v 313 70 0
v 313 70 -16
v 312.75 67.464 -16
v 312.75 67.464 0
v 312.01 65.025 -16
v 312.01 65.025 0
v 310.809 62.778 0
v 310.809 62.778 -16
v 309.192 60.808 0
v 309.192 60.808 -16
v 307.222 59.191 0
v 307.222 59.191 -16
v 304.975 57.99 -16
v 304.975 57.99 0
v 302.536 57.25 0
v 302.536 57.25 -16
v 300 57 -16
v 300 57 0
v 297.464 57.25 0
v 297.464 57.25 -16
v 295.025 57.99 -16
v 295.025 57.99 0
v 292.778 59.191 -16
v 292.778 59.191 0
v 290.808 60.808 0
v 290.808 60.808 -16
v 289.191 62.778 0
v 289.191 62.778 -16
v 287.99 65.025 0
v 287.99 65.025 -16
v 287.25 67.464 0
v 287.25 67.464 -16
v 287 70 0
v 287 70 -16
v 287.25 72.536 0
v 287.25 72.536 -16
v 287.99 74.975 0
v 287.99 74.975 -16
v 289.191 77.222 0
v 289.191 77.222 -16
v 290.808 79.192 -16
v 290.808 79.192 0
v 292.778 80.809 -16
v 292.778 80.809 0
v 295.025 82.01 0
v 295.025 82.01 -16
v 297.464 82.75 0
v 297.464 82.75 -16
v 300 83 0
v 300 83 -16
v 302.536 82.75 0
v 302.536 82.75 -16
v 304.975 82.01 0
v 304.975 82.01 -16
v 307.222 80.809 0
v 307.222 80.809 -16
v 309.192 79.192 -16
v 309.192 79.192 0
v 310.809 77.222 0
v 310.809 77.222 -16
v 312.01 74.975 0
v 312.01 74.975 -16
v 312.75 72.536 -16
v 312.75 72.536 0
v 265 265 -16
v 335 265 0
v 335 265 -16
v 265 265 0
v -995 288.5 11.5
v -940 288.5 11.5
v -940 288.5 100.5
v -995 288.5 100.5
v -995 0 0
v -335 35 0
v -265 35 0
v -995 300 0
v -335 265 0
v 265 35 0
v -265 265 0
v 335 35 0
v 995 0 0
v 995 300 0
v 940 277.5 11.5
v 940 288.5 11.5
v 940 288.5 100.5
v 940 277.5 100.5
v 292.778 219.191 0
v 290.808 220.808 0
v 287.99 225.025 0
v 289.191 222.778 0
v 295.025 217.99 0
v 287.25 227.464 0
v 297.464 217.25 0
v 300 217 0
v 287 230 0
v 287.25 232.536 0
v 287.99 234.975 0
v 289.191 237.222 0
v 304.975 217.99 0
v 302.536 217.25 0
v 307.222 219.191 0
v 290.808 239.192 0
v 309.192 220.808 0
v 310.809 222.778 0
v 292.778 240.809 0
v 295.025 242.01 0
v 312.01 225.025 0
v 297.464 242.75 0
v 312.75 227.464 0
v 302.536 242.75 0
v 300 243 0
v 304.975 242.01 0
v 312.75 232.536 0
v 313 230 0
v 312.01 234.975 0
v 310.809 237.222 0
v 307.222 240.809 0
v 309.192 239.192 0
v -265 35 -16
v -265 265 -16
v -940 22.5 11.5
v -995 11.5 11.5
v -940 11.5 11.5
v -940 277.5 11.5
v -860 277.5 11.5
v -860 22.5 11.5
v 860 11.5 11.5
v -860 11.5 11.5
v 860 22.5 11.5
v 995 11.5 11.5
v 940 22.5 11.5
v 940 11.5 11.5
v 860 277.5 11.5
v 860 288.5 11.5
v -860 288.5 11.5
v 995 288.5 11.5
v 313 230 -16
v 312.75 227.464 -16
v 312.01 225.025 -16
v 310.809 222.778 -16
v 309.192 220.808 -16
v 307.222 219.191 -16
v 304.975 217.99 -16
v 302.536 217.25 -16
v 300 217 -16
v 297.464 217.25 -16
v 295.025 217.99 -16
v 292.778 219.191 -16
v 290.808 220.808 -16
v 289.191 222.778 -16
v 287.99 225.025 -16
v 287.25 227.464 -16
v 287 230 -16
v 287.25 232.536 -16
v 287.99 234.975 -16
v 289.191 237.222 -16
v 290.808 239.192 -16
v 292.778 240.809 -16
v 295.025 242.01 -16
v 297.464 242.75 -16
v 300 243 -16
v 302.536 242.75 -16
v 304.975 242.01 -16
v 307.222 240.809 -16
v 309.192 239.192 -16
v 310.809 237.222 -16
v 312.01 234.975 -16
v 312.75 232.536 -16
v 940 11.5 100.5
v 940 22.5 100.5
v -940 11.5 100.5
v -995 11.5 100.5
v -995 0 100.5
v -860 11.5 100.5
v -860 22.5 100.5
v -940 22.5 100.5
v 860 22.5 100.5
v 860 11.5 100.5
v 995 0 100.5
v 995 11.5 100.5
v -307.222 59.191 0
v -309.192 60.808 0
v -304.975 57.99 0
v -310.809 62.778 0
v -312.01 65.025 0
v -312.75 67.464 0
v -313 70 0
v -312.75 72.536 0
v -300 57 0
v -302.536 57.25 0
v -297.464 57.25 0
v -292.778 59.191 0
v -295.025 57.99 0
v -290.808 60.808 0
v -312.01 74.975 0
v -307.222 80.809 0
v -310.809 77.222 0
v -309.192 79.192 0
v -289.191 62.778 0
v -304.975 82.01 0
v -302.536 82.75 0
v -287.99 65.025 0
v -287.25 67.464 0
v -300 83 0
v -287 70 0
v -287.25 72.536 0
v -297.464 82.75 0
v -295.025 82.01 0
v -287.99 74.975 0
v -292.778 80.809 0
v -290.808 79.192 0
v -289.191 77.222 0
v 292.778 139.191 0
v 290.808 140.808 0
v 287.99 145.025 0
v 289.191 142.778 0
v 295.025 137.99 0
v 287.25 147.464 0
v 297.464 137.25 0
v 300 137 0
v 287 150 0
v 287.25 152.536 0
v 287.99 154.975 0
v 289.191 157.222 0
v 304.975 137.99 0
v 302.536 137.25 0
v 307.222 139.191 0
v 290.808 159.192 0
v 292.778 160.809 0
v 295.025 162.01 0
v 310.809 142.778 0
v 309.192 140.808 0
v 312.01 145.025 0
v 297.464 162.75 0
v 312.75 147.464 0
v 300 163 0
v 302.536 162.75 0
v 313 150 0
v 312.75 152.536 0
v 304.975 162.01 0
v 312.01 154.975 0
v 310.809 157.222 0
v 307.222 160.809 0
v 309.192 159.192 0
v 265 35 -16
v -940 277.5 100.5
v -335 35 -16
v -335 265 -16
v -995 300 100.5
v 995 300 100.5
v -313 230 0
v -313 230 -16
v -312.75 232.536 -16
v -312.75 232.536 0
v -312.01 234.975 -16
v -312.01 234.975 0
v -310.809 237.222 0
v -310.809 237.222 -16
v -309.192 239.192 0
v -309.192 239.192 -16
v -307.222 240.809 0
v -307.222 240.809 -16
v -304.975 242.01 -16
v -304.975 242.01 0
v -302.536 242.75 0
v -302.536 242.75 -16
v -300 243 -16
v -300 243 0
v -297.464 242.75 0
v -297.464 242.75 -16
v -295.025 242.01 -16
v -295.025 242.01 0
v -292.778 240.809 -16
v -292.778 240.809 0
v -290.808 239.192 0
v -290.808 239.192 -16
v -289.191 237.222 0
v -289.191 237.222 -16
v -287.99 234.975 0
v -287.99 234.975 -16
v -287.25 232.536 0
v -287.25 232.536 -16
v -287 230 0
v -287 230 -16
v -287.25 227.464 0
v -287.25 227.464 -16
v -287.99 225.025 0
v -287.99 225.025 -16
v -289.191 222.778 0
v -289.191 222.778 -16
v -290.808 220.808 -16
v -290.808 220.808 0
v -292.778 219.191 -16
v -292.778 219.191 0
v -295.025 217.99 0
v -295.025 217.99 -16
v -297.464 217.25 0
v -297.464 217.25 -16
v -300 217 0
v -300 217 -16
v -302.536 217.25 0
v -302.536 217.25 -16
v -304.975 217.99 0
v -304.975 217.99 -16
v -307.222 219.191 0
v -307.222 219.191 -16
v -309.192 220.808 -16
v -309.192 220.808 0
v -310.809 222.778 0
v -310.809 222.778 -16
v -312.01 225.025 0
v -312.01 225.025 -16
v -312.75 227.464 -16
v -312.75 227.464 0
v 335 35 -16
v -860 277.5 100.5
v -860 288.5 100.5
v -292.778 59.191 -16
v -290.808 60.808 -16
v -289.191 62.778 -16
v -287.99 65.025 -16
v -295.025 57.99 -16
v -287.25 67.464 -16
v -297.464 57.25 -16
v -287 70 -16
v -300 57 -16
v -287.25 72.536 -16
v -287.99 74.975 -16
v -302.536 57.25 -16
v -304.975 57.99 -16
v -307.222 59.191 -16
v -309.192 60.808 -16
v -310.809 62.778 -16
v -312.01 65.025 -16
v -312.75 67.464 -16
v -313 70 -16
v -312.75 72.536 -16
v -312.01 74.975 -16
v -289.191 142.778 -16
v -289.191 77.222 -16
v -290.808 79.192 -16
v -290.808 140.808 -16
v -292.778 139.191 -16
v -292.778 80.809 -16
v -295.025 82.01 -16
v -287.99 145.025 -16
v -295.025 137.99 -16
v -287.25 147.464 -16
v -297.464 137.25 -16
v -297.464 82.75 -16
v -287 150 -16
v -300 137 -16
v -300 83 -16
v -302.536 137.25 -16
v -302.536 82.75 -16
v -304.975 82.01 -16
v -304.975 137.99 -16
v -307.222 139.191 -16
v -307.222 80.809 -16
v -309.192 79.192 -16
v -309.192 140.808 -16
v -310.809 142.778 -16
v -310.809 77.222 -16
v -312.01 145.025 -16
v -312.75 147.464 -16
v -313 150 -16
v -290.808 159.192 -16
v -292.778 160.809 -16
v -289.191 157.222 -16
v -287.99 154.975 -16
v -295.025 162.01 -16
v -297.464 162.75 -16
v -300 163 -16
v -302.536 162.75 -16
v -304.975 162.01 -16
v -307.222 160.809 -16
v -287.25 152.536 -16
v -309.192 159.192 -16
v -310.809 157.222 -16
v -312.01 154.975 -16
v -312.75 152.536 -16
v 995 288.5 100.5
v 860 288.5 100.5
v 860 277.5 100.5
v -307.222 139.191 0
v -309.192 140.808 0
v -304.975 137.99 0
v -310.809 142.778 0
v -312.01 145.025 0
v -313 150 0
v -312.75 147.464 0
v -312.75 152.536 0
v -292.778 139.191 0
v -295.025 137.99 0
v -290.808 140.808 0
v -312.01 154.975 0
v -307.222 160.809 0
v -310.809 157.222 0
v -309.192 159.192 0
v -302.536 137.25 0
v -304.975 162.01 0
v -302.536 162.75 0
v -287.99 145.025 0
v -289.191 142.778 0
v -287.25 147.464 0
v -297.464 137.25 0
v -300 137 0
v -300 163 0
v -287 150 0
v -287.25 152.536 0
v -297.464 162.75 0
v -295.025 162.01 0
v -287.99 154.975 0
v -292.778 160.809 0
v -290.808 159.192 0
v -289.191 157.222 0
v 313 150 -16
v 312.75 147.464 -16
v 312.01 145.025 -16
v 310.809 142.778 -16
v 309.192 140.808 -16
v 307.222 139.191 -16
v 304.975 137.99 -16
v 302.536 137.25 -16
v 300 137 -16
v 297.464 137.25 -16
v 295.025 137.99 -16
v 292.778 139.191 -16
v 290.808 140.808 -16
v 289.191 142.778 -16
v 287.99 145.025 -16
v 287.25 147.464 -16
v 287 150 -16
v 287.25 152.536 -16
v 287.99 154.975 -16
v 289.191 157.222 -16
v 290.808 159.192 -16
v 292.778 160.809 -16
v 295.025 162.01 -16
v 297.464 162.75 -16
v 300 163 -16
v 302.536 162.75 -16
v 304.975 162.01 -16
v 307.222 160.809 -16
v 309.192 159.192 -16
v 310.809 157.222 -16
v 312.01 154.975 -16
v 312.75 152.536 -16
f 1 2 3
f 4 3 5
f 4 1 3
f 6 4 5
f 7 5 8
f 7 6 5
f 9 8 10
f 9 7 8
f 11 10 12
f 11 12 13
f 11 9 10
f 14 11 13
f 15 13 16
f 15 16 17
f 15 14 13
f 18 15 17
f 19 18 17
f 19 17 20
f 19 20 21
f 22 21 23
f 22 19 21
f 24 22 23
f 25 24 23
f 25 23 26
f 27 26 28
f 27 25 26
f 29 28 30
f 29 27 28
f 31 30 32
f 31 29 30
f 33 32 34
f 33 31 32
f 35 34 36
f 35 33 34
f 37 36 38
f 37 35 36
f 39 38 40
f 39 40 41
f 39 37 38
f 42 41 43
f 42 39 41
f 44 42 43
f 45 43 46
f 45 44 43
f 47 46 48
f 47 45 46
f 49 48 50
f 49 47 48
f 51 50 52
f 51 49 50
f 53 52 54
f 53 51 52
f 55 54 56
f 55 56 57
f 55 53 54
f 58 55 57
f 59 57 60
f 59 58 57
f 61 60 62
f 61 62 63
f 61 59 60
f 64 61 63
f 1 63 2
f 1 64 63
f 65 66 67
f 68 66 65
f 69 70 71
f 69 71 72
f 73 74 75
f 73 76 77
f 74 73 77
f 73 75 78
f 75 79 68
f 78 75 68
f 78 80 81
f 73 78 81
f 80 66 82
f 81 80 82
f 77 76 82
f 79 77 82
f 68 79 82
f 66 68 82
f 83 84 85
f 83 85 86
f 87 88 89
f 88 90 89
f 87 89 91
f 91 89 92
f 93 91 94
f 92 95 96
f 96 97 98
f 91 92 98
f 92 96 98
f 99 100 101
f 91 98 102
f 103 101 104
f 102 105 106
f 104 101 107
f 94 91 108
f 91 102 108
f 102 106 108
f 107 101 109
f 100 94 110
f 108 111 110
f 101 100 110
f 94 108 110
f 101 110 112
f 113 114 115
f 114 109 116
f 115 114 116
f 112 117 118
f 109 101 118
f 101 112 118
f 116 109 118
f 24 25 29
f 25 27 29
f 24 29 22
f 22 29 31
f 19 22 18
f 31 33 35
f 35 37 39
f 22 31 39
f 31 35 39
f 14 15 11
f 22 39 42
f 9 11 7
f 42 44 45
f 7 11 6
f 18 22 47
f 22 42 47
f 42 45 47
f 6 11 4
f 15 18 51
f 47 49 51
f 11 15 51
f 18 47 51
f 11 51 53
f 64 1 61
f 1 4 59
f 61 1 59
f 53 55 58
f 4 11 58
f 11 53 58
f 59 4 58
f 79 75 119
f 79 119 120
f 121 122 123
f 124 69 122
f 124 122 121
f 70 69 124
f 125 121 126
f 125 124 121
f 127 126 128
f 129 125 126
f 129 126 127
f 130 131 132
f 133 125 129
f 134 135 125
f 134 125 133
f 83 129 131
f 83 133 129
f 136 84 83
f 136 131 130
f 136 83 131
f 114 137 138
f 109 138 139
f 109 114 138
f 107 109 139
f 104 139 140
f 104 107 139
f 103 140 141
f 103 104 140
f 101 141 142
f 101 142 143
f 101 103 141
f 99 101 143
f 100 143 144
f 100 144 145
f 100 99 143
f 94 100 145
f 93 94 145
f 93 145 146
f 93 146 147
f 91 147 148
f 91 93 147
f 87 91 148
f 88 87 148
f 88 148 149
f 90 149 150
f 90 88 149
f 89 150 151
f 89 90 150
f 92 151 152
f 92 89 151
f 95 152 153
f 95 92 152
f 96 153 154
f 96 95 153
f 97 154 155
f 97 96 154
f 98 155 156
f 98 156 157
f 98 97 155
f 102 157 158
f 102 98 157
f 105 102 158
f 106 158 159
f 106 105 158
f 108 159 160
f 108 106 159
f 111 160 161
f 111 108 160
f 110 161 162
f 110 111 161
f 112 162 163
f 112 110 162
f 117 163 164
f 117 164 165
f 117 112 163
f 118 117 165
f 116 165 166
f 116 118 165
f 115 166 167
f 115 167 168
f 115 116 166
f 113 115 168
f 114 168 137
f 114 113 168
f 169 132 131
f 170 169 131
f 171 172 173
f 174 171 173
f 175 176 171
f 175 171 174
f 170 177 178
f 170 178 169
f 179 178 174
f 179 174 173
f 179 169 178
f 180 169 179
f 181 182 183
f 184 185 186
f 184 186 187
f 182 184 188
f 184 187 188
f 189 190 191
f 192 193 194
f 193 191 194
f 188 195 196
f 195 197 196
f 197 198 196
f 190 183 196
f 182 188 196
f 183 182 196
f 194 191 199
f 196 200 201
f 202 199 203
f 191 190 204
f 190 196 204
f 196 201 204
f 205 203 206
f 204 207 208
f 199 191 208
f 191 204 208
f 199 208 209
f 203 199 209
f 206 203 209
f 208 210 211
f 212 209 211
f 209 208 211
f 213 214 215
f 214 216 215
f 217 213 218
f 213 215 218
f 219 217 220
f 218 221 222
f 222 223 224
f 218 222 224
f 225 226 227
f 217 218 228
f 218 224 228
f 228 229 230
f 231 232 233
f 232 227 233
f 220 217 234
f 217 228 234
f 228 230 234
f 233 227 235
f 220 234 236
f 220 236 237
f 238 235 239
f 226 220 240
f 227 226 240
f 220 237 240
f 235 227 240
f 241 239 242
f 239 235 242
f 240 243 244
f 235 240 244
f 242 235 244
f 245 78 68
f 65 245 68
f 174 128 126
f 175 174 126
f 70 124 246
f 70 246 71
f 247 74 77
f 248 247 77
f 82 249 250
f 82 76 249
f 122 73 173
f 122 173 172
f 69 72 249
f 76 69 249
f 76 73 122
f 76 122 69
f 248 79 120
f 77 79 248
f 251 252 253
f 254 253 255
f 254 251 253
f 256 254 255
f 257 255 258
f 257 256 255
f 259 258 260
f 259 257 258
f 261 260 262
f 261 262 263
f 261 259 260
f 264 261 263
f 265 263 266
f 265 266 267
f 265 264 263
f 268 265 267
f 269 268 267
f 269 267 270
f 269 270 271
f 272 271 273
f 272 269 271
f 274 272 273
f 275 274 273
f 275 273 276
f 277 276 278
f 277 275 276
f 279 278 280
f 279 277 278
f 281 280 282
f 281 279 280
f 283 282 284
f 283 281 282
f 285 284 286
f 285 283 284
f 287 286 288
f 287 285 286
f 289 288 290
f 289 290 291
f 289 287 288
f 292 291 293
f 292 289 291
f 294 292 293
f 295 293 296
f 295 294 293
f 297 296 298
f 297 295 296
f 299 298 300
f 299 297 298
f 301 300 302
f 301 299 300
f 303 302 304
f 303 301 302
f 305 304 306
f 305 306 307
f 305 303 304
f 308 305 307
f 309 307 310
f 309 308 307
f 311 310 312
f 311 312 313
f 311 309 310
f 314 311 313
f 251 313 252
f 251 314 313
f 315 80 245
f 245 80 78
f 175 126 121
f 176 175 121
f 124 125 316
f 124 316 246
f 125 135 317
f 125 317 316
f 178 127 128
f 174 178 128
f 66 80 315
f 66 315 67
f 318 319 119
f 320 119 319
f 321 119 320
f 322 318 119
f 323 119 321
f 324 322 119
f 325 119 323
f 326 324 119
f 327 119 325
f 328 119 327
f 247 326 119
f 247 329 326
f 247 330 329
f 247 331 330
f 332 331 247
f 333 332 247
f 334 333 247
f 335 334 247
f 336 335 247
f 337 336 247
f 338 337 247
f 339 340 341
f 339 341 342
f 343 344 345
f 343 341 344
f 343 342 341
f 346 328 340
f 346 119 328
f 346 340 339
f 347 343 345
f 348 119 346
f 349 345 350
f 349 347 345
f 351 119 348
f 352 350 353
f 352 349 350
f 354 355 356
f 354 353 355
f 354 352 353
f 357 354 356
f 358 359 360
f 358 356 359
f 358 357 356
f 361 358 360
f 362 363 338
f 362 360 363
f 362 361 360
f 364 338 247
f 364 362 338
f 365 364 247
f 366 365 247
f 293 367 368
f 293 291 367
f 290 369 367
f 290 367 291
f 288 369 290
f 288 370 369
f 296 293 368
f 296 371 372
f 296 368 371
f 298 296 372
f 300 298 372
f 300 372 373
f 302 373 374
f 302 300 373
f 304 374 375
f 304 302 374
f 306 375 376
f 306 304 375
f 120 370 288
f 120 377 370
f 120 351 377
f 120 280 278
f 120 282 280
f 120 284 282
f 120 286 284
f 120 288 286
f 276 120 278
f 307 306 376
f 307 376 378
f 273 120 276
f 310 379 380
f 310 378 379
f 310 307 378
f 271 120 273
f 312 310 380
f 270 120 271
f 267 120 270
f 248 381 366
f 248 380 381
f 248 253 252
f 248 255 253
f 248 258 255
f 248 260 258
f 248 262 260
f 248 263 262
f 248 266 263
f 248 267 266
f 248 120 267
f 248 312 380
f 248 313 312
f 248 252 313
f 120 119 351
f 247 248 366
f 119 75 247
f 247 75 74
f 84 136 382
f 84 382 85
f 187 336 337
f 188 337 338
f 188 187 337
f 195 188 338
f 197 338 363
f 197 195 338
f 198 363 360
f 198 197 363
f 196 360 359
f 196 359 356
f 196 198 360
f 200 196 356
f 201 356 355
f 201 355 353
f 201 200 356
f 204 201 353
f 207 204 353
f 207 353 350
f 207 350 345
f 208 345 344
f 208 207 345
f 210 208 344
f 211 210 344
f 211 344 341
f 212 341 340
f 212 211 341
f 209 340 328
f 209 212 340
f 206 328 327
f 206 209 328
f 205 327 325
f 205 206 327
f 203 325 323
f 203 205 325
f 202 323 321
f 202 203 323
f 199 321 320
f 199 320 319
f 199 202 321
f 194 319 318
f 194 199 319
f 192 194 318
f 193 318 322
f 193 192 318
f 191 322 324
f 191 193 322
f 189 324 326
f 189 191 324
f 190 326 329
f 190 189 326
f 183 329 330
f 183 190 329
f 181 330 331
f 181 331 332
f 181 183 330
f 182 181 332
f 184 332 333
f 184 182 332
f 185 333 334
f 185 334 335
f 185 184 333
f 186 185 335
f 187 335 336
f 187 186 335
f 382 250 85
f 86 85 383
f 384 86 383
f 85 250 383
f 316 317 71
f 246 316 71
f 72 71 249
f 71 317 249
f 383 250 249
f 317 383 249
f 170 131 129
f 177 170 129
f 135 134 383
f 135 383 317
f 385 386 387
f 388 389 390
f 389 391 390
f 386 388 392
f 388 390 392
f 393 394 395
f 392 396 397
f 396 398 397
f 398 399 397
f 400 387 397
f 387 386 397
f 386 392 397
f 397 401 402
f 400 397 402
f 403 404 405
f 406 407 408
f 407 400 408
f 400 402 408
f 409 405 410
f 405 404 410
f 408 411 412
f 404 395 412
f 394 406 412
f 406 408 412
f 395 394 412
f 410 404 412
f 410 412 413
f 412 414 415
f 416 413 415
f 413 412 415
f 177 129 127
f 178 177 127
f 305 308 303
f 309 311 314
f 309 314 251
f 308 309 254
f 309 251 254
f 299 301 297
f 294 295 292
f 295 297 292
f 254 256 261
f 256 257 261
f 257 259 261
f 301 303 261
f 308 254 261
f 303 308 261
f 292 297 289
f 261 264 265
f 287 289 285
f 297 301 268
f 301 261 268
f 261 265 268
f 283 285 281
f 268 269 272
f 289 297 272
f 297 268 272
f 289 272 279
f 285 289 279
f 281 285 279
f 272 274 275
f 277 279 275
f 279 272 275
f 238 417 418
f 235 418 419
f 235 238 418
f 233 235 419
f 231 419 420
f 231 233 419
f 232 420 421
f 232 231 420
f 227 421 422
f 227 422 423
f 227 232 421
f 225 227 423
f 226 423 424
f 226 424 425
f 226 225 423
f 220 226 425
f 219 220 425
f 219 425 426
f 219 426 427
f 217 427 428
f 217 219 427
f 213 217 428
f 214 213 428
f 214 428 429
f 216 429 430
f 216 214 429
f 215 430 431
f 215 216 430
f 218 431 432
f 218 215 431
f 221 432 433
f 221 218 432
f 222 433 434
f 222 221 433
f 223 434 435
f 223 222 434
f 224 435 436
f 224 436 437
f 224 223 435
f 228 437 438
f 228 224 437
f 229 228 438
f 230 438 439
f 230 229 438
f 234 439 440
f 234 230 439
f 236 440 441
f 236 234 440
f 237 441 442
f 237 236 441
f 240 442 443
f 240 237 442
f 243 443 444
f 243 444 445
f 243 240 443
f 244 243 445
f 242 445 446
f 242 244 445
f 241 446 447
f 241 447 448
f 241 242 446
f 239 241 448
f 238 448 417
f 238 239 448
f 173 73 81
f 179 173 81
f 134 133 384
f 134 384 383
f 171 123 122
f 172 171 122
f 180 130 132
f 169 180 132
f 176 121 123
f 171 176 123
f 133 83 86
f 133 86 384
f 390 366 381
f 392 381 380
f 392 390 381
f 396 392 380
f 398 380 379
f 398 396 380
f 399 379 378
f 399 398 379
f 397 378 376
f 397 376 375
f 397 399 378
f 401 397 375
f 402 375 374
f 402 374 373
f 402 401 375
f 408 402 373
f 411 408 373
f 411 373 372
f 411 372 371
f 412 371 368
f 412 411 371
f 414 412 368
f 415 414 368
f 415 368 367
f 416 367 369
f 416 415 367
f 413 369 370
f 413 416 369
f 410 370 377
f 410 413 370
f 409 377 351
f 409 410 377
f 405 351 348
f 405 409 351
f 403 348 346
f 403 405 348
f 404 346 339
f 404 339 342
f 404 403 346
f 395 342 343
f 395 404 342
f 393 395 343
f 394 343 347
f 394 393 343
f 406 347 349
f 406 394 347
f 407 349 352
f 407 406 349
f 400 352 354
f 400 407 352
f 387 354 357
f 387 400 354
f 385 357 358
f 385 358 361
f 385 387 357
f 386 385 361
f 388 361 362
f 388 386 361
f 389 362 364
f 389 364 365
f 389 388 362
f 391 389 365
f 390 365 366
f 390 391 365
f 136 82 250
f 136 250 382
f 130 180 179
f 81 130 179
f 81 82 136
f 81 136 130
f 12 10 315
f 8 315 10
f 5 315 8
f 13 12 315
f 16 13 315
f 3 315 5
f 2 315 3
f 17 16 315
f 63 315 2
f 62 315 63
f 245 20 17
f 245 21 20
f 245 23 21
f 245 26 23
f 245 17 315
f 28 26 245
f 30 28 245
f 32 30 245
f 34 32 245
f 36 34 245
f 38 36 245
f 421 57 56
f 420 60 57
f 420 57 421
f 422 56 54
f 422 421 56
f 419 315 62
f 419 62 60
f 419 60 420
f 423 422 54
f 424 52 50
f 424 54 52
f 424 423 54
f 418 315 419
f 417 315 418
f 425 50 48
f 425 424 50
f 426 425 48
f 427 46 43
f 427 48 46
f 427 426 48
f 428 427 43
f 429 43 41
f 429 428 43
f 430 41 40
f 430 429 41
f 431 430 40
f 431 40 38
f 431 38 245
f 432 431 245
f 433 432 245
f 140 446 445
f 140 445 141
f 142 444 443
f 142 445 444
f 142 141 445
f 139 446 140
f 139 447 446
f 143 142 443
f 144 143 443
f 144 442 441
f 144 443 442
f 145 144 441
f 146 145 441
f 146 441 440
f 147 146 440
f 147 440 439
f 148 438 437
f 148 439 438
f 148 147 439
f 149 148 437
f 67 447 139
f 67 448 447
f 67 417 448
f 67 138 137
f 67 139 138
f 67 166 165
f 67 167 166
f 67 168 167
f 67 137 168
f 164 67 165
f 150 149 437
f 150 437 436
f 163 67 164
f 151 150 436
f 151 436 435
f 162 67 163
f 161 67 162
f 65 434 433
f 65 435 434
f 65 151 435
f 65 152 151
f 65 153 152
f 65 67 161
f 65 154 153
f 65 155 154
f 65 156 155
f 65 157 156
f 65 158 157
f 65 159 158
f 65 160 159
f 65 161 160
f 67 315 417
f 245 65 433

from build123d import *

# Parameters (mm, degrees)
SKETCH_1_W        = 1990
SKETCH_1_H        = 300
EXTRUDE_371_DEPTH = 11.5
EXTRUDE_1_DEPTH   = 89
SKETCH_7_W        = 70
SKETCH_7_H        = 230
SKETCH_7_R        = 13
EXTRUDE_2_DEPTH   = 16


with BuildPart() as part:
    # 草图1 → Extrude 371 (new body)
    with BuildSketch(Plane.XY):
        with Locations((0, 150)):
            Rectangle(SKETCH_1_W, SKETCH_1_H)
    extrude(amount=EXTRUDE_371_DEPTH)

    # 草图2 → 凸台-拉伸1 (add)
    with BuildSketch(Plane.XY.offset(11.5)):
        Polygon((-995, 300), (995, 300), (995, 288.5), (940, 288.5), (940, 277.5), (860, 277.5), (860, 288.5), (-860, 288.5), (-860, 277.5), (-940, 277.5), (-940, 288.5), (-995, 288.5), align=None)
        Polygon((-995, 0), (995, 0), (995, 11.5), (940, 11.5), (940, 22.5), (860, 22.5), (860, 11.5), (-860, 11.5), (-860, 22.5), (-940, 22.5), (-940, 11.5), (-995, 11.5), align=None)
    extrude(amount=EXTRUDE_1_DEPTH)

    # 草图7 → 凸台-拉伸2 (add)
    # profile 1 of 2: a face of its own
    with BuildSketch(Plane(origin=(0, 0, 0), x_dir=(-1, 0, 0), z_dir=(0, 0, -1))):
        with Locations((300, 150)):
            Rectangle(SKETCH_7_W, SKETCH_7_H)
        with Locations((300, 230)):
            Circle(SKETCH_7_R, mode=Mode.SUBTRACT)
        with Locations((300, 150)):
            Circle(SKETCH_7_R, mode=Mode.SUBTRACT)
        with Locations((300, 70)):
            Circle(SKETCH_7_R, mode=Mode.SUBTRACT)
    # profile 2 of 2: a face of its own
    with BuildSketch(Plane(origin=(0, 0, 0), x_dir=(-1, 0, 0), z_dir=(0, 0, -1))):
        with Locations((-300, 150)):
            Rectangle(SKETCH_7_W, SKETCH_7_H)
        with Locations(Location((-300, 70, 0), (0, 0, 180))):
            Circle(SKETCH_7_R, mode=Mode.SUBTRACT)
        with Locations(Location((-300, 150, 0), (0, 0, 180))):
            Circle(SKETCH_7_R, mode=Mode.SUBTRACT)
        with Locations(Location((-300, 230, 0), (0, 0, 180))):
            Circle(SKETCH_7_R, mode=Mode.SUBTRACT)
    extrude(amount=EXTRUDE_2_DEPTH)


solid = part.part
